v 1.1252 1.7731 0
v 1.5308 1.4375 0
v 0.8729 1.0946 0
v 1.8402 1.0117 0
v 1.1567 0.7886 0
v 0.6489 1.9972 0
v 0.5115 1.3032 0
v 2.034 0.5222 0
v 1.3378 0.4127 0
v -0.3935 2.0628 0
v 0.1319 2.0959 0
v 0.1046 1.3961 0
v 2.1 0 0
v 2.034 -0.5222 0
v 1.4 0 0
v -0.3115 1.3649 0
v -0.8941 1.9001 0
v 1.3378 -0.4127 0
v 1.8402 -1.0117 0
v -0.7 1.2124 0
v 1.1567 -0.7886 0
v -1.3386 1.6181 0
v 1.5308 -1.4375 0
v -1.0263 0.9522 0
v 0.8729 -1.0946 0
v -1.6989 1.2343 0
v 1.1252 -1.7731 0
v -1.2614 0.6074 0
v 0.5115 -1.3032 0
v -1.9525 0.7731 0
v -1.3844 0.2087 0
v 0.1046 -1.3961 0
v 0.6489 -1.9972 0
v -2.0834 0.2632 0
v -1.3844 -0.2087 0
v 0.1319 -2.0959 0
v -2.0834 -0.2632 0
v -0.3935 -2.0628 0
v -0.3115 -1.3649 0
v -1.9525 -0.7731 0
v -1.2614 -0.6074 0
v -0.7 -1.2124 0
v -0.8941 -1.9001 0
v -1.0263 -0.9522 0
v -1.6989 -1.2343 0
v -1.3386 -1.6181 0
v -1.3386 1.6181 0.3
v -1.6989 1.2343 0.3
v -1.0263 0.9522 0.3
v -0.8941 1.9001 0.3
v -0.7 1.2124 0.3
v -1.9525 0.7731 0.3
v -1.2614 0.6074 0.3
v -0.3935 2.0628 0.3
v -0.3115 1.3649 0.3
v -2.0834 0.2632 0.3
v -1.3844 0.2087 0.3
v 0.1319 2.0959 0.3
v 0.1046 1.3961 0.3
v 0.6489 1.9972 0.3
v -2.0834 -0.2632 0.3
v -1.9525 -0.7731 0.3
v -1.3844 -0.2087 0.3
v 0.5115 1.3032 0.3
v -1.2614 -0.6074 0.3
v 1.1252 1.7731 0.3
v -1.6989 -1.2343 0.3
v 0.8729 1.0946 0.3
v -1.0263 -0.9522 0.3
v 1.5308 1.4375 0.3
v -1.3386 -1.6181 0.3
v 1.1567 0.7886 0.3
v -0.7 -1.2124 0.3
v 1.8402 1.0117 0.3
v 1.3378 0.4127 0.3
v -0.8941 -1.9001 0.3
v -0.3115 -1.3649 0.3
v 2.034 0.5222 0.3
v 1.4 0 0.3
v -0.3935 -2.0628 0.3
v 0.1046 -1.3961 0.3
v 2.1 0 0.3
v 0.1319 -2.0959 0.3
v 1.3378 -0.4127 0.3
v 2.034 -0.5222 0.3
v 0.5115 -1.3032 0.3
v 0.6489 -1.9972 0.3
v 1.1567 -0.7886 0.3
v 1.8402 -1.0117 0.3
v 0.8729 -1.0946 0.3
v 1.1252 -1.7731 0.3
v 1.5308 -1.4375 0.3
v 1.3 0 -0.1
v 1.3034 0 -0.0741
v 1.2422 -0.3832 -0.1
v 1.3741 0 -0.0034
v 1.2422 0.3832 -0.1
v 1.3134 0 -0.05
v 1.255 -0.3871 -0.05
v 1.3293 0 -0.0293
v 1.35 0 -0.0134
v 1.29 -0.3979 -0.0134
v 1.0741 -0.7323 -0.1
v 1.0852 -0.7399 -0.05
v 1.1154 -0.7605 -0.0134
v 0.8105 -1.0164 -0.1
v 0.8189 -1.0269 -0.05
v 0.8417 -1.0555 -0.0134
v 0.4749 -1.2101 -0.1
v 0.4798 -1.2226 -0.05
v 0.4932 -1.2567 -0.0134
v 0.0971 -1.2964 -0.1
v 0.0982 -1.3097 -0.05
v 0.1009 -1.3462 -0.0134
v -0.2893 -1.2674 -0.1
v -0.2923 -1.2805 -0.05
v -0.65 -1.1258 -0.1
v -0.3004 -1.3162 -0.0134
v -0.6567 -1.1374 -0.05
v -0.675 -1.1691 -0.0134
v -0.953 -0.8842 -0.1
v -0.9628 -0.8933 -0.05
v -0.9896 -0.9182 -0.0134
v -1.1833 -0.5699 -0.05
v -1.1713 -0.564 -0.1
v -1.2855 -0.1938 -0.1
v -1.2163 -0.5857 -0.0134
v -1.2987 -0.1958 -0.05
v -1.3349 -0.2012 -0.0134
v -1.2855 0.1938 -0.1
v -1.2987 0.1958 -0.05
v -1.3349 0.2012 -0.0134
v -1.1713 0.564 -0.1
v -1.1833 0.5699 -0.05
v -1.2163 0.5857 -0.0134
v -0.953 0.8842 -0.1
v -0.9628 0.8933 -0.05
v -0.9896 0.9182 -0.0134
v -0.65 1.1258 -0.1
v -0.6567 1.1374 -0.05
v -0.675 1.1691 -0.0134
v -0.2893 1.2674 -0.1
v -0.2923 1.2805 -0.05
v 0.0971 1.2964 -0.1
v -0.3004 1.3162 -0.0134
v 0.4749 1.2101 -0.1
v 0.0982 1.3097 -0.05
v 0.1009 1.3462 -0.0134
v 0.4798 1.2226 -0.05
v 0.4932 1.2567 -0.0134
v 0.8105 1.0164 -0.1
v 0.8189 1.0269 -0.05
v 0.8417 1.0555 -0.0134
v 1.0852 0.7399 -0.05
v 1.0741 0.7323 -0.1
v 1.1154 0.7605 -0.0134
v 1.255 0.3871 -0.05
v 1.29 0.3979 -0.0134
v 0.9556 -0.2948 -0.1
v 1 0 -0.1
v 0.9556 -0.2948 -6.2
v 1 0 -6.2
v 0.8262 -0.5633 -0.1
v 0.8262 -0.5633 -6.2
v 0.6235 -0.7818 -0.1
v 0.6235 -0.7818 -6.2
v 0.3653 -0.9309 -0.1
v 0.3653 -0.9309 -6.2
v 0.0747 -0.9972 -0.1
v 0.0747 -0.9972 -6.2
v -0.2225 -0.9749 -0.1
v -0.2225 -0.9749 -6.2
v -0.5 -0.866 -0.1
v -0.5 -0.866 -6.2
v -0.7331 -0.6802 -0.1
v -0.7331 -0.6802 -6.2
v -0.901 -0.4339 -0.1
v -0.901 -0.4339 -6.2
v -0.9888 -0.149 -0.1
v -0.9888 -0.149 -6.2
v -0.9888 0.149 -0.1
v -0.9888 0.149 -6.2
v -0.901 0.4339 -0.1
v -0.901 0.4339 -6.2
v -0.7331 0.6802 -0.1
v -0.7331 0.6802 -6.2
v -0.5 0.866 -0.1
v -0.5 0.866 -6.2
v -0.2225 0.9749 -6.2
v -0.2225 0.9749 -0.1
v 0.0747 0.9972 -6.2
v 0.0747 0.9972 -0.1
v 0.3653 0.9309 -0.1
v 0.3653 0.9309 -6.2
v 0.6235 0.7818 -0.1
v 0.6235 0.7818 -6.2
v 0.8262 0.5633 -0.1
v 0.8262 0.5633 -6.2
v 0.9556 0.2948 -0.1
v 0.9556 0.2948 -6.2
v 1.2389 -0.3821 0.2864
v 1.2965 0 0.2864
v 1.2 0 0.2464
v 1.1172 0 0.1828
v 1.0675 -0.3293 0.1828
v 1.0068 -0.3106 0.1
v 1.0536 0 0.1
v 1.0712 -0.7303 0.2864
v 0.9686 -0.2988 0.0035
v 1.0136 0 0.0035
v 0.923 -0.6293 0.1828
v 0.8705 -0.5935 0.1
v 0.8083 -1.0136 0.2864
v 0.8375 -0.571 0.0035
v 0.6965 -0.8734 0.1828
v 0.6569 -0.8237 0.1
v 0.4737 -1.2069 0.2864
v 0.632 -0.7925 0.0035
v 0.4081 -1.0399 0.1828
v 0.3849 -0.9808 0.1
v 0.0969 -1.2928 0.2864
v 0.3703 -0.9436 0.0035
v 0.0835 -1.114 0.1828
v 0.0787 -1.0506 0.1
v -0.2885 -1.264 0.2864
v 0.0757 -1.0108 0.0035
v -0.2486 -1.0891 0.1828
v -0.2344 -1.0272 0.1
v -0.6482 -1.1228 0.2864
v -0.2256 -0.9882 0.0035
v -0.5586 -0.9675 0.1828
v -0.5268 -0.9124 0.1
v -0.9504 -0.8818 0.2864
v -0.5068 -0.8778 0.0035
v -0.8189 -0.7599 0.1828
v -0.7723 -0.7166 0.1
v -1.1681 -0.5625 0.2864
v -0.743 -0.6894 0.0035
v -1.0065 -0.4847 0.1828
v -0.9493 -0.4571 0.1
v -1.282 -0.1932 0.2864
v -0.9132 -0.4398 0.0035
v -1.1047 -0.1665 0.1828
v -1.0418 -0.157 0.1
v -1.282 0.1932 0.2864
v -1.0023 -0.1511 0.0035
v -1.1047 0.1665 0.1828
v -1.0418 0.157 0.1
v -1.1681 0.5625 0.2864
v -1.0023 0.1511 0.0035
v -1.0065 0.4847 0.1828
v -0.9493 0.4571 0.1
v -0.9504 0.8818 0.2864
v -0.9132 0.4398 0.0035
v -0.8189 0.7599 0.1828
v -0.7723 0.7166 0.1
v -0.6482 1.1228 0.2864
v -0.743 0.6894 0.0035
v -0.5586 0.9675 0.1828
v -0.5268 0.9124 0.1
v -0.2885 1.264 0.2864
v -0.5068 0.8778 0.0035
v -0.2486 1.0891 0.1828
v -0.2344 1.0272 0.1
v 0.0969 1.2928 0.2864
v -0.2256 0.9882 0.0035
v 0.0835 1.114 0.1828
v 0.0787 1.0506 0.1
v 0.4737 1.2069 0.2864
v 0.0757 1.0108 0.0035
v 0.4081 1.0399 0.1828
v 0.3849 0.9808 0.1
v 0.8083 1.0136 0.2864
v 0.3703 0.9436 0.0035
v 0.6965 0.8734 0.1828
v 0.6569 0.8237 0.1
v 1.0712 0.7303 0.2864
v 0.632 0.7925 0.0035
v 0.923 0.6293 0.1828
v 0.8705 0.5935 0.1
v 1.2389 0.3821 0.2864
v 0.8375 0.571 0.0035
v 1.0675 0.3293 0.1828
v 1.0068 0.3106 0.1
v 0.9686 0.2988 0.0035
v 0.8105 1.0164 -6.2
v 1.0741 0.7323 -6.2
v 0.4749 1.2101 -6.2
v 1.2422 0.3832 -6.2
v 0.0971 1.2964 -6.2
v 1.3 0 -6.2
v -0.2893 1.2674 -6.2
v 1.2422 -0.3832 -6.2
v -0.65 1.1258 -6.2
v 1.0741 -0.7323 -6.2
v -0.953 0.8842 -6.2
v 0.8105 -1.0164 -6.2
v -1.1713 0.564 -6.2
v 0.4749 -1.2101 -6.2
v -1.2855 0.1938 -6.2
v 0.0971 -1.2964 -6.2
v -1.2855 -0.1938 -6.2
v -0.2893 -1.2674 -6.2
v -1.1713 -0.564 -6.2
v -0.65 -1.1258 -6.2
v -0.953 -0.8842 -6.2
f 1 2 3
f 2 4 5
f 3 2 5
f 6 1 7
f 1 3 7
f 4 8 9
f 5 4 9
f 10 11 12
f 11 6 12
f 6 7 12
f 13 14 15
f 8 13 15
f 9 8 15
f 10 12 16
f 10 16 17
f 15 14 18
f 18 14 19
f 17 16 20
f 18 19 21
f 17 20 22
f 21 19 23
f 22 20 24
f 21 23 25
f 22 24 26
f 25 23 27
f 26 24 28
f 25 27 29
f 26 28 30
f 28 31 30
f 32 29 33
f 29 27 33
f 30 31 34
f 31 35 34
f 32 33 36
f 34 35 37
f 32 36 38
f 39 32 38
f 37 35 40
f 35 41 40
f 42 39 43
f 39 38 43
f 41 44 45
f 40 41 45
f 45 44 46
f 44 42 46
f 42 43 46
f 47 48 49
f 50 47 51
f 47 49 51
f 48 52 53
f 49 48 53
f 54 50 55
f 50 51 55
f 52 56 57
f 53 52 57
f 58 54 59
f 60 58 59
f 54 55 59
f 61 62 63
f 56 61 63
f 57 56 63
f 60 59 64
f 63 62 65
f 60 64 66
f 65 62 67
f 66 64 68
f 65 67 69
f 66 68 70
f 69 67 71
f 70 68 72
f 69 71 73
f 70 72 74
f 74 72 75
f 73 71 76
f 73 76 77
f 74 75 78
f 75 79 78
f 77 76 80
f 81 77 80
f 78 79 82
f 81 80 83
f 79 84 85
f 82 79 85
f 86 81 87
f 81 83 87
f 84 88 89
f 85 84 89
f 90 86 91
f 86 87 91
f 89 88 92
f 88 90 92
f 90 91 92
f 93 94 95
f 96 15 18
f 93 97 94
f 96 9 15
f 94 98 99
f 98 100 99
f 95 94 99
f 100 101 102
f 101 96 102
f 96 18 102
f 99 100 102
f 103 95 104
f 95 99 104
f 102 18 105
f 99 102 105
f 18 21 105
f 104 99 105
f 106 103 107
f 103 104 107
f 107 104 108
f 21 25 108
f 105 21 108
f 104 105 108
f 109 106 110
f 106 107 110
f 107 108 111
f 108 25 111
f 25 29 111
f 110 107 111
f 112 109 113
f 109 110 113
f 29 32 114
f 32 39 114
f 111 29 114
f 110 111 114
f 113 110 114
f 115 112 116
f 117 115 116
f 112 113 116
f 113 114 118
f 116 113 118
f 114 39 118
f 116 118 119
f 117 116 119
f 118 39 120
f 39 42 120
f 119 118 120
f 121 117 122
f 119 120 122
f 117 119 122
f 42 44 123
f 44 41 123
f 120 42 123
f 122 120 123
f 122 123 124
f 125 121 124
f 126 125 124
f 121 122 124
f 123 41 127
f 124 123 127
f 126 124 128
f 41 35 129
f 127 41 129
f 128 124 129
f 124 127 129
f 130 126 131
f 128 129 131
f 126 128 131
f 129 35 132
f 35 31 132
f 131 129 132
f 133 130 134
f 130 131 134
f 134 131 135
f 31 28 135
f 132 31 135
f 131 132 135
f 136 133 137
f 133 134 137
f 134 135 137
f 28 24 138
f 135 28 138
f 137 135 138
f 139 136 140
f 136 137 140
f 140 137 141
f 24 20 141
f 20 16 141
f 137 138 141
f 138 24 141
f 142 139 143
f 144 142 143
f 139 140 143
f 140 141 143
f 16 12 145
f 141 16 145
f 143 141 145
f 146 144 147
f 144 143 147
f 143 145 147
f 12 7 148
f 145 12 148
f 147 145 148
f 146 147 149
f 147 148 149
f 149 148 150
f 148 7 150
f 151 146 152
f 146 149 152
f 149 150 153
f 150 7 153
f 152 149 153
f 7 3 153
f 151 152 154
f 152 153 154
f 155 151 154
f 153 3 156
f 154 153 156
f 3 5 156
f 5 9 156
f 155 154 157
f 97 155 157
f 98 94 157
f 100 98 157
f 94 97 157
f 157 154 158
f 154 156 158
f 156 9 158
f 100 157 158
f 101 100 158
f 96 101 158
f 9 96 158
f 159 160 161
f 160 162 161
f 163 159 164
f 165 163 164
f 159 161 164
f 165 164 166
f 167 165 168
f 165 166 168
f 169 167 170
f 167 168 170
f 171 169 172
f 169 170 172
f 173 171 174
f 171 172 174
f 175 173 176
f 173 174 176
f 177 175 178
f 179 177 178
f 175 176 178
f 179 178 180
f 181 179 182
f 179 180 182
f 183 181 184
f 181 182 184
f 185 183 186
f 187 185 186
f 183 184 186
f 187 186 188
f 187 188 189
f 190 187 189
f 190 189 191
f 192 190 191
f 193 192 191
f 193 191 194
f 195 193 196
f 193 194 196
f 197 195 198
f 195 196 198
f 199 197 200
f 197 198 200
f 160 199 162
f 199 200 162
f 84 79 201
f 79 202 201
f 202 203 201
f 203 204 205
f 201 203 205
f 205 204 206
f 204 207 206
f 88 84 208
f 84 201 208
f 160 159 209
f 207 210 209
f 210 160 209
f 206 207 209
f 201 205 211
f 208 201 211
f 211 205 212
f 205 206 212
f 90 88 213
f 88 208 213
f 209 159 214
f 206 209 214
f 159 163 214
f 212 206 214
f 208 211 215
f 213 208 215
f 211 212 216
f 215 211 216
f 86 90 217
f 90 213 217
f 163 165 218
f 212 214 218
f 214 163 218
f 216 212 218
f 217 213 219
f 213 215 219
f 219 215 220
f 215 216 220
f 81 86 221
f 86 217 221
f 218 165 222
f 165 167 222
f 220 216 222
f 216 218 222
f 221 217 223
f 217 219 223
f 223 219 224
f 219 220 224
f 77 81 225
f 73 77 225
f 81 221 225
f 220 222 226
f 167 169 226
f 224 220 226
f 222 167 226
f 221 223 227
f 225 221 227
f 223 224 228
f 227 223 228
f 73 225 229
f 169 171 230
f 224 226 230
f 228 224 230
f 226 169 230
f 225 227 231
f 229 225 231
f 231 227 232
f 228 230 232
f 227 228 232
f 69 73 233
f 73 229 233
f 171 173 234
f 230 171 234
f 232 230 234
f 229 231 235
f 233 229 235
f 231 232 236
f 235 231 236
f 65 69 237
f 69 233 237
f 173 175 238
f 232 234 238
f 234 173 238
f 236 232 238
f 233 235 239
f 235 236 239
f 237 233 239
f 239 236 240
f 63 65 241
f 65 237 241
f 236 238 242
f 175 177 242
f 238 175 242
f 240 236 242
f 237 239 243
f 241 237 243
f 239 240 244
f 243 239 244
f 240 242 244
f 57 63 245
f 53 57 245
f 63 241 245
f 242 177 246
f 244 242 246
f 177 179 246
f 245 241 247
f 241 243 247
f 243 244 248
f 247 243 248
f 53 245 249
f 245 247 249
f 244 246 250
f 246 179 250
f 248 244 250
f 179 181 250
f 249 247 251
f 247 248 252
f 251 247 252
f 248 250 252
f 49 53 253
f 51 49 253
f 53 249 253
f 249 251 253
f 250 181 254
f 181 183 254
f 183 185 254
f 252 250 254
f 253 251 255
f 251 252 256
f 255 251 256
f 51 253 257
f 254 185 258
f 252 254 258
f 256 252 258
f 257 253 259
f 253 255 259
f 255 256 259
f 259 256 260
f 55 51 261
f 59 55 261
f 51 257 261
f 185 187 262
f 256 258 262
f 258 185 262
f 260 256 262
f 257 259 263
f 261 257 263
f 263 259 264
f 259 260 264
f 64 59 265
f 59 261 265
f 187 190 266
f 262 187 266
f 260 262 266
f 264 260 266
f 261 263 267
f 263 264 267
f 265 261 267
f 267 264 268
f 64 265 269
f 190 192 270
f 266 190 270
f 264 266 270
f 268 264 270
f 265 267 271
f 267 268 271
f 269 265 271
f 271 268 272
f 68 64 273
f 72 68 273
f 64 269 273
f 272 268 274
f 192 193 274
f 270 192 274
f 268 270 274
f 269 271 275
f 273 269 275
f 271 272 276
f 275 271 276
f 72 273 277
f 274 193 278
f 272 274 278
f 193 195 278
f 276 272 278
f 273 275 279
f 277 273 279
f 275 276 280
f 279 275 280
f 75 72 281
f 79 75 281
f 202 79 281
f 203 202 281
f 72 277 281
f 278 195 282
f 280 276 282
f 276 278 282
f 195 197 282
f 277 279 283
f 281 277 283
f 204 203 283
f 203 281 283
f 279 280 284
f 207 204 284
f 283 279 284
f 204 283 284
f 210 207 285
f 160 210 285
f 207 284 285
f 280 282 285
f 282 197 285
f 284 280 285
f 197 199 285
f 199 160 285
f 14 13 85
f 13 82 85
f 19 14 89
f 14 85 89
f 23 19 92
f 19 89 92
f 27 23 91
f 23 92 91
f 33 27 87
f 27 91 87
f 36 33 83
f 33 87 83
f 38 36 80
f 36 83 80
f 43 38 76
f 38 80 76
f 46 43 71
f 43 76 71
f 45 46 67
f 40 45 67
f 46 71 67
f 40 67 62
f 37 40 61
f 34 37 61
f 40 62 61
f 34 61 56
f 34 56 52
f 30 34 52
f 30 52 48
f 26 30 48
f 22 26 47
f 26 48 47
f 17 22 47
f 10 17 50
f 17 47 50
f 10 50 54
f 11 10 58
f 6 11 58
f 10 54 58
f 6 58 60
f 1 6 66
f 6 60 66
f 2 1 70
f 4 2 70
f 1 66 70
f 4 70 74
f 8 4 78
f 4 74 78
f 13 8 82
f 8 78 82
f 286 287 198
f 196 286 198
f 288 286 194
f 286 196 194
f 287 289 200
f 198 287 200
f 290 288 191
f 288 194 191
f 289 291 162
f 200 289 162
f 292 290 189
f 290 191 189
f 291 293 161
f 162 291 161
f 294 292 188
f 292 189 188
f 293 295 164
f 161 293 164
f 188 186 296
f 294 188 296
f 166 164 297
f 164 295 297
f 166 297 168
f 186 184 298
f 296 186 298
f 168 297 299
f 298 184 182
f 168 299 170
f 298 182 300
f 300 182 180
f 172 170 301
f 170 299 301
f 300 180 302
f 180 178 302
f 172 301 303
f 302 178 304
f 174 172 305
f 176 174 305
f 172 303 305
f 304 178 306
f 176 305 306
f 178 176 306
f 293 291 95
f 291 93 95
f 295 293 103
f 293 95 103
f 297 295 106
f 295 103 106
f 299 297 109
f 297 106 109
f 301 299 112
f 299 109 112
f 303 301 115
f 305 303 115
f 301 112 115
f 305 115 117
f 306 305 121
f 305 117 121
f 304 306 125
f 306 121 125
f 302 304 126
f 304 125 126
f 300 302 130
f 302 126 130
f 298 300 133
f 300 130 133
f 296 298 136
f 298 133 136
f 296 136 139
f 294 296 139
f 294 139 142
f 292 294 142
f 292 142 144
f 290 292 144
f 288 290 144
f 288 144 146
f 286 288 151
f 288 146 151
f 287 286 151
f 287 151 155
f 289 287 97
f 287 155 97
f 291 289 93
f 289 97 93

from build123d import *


with BuildPart() as part:
    # Esquisse1 → base (revolve)
    with BuildSketch(Plane(origin=(0, 0, 0), x_dir=(0, 0, -1), z_dir=(1, 0, 0)), mode=Mode.PRIVATE) as base_sk:
        with BuildLine():
            Line((6.2, 1), (6.2, 1.3))
            Line((6.2, 1.3), (0.1, 1.3))
            ThreePointArc((0.1, 1.3), (0.029289322, 1.329289322), (0, 1.4))
            Line((0, 1.4), (0, 2.1))
            Line((0, 2.1), (-0.3, 2.1))
            Line((-0.3, 2.1), (-0.3, 1.4))
            ThreePointArc((-0.3, 1.4), (-0.182842712, 1.117157288), (0.1, 1))
            Line((0.1, 1), (6.2, 1))
        make_face()
    revolve(base_sk.sketch.rotate(Axis((0, 0, 0.3), (0, 0, -1)), 90), axis=Axis((0, 0, 0.3), (0, 0, -1)))


solid = part.part
